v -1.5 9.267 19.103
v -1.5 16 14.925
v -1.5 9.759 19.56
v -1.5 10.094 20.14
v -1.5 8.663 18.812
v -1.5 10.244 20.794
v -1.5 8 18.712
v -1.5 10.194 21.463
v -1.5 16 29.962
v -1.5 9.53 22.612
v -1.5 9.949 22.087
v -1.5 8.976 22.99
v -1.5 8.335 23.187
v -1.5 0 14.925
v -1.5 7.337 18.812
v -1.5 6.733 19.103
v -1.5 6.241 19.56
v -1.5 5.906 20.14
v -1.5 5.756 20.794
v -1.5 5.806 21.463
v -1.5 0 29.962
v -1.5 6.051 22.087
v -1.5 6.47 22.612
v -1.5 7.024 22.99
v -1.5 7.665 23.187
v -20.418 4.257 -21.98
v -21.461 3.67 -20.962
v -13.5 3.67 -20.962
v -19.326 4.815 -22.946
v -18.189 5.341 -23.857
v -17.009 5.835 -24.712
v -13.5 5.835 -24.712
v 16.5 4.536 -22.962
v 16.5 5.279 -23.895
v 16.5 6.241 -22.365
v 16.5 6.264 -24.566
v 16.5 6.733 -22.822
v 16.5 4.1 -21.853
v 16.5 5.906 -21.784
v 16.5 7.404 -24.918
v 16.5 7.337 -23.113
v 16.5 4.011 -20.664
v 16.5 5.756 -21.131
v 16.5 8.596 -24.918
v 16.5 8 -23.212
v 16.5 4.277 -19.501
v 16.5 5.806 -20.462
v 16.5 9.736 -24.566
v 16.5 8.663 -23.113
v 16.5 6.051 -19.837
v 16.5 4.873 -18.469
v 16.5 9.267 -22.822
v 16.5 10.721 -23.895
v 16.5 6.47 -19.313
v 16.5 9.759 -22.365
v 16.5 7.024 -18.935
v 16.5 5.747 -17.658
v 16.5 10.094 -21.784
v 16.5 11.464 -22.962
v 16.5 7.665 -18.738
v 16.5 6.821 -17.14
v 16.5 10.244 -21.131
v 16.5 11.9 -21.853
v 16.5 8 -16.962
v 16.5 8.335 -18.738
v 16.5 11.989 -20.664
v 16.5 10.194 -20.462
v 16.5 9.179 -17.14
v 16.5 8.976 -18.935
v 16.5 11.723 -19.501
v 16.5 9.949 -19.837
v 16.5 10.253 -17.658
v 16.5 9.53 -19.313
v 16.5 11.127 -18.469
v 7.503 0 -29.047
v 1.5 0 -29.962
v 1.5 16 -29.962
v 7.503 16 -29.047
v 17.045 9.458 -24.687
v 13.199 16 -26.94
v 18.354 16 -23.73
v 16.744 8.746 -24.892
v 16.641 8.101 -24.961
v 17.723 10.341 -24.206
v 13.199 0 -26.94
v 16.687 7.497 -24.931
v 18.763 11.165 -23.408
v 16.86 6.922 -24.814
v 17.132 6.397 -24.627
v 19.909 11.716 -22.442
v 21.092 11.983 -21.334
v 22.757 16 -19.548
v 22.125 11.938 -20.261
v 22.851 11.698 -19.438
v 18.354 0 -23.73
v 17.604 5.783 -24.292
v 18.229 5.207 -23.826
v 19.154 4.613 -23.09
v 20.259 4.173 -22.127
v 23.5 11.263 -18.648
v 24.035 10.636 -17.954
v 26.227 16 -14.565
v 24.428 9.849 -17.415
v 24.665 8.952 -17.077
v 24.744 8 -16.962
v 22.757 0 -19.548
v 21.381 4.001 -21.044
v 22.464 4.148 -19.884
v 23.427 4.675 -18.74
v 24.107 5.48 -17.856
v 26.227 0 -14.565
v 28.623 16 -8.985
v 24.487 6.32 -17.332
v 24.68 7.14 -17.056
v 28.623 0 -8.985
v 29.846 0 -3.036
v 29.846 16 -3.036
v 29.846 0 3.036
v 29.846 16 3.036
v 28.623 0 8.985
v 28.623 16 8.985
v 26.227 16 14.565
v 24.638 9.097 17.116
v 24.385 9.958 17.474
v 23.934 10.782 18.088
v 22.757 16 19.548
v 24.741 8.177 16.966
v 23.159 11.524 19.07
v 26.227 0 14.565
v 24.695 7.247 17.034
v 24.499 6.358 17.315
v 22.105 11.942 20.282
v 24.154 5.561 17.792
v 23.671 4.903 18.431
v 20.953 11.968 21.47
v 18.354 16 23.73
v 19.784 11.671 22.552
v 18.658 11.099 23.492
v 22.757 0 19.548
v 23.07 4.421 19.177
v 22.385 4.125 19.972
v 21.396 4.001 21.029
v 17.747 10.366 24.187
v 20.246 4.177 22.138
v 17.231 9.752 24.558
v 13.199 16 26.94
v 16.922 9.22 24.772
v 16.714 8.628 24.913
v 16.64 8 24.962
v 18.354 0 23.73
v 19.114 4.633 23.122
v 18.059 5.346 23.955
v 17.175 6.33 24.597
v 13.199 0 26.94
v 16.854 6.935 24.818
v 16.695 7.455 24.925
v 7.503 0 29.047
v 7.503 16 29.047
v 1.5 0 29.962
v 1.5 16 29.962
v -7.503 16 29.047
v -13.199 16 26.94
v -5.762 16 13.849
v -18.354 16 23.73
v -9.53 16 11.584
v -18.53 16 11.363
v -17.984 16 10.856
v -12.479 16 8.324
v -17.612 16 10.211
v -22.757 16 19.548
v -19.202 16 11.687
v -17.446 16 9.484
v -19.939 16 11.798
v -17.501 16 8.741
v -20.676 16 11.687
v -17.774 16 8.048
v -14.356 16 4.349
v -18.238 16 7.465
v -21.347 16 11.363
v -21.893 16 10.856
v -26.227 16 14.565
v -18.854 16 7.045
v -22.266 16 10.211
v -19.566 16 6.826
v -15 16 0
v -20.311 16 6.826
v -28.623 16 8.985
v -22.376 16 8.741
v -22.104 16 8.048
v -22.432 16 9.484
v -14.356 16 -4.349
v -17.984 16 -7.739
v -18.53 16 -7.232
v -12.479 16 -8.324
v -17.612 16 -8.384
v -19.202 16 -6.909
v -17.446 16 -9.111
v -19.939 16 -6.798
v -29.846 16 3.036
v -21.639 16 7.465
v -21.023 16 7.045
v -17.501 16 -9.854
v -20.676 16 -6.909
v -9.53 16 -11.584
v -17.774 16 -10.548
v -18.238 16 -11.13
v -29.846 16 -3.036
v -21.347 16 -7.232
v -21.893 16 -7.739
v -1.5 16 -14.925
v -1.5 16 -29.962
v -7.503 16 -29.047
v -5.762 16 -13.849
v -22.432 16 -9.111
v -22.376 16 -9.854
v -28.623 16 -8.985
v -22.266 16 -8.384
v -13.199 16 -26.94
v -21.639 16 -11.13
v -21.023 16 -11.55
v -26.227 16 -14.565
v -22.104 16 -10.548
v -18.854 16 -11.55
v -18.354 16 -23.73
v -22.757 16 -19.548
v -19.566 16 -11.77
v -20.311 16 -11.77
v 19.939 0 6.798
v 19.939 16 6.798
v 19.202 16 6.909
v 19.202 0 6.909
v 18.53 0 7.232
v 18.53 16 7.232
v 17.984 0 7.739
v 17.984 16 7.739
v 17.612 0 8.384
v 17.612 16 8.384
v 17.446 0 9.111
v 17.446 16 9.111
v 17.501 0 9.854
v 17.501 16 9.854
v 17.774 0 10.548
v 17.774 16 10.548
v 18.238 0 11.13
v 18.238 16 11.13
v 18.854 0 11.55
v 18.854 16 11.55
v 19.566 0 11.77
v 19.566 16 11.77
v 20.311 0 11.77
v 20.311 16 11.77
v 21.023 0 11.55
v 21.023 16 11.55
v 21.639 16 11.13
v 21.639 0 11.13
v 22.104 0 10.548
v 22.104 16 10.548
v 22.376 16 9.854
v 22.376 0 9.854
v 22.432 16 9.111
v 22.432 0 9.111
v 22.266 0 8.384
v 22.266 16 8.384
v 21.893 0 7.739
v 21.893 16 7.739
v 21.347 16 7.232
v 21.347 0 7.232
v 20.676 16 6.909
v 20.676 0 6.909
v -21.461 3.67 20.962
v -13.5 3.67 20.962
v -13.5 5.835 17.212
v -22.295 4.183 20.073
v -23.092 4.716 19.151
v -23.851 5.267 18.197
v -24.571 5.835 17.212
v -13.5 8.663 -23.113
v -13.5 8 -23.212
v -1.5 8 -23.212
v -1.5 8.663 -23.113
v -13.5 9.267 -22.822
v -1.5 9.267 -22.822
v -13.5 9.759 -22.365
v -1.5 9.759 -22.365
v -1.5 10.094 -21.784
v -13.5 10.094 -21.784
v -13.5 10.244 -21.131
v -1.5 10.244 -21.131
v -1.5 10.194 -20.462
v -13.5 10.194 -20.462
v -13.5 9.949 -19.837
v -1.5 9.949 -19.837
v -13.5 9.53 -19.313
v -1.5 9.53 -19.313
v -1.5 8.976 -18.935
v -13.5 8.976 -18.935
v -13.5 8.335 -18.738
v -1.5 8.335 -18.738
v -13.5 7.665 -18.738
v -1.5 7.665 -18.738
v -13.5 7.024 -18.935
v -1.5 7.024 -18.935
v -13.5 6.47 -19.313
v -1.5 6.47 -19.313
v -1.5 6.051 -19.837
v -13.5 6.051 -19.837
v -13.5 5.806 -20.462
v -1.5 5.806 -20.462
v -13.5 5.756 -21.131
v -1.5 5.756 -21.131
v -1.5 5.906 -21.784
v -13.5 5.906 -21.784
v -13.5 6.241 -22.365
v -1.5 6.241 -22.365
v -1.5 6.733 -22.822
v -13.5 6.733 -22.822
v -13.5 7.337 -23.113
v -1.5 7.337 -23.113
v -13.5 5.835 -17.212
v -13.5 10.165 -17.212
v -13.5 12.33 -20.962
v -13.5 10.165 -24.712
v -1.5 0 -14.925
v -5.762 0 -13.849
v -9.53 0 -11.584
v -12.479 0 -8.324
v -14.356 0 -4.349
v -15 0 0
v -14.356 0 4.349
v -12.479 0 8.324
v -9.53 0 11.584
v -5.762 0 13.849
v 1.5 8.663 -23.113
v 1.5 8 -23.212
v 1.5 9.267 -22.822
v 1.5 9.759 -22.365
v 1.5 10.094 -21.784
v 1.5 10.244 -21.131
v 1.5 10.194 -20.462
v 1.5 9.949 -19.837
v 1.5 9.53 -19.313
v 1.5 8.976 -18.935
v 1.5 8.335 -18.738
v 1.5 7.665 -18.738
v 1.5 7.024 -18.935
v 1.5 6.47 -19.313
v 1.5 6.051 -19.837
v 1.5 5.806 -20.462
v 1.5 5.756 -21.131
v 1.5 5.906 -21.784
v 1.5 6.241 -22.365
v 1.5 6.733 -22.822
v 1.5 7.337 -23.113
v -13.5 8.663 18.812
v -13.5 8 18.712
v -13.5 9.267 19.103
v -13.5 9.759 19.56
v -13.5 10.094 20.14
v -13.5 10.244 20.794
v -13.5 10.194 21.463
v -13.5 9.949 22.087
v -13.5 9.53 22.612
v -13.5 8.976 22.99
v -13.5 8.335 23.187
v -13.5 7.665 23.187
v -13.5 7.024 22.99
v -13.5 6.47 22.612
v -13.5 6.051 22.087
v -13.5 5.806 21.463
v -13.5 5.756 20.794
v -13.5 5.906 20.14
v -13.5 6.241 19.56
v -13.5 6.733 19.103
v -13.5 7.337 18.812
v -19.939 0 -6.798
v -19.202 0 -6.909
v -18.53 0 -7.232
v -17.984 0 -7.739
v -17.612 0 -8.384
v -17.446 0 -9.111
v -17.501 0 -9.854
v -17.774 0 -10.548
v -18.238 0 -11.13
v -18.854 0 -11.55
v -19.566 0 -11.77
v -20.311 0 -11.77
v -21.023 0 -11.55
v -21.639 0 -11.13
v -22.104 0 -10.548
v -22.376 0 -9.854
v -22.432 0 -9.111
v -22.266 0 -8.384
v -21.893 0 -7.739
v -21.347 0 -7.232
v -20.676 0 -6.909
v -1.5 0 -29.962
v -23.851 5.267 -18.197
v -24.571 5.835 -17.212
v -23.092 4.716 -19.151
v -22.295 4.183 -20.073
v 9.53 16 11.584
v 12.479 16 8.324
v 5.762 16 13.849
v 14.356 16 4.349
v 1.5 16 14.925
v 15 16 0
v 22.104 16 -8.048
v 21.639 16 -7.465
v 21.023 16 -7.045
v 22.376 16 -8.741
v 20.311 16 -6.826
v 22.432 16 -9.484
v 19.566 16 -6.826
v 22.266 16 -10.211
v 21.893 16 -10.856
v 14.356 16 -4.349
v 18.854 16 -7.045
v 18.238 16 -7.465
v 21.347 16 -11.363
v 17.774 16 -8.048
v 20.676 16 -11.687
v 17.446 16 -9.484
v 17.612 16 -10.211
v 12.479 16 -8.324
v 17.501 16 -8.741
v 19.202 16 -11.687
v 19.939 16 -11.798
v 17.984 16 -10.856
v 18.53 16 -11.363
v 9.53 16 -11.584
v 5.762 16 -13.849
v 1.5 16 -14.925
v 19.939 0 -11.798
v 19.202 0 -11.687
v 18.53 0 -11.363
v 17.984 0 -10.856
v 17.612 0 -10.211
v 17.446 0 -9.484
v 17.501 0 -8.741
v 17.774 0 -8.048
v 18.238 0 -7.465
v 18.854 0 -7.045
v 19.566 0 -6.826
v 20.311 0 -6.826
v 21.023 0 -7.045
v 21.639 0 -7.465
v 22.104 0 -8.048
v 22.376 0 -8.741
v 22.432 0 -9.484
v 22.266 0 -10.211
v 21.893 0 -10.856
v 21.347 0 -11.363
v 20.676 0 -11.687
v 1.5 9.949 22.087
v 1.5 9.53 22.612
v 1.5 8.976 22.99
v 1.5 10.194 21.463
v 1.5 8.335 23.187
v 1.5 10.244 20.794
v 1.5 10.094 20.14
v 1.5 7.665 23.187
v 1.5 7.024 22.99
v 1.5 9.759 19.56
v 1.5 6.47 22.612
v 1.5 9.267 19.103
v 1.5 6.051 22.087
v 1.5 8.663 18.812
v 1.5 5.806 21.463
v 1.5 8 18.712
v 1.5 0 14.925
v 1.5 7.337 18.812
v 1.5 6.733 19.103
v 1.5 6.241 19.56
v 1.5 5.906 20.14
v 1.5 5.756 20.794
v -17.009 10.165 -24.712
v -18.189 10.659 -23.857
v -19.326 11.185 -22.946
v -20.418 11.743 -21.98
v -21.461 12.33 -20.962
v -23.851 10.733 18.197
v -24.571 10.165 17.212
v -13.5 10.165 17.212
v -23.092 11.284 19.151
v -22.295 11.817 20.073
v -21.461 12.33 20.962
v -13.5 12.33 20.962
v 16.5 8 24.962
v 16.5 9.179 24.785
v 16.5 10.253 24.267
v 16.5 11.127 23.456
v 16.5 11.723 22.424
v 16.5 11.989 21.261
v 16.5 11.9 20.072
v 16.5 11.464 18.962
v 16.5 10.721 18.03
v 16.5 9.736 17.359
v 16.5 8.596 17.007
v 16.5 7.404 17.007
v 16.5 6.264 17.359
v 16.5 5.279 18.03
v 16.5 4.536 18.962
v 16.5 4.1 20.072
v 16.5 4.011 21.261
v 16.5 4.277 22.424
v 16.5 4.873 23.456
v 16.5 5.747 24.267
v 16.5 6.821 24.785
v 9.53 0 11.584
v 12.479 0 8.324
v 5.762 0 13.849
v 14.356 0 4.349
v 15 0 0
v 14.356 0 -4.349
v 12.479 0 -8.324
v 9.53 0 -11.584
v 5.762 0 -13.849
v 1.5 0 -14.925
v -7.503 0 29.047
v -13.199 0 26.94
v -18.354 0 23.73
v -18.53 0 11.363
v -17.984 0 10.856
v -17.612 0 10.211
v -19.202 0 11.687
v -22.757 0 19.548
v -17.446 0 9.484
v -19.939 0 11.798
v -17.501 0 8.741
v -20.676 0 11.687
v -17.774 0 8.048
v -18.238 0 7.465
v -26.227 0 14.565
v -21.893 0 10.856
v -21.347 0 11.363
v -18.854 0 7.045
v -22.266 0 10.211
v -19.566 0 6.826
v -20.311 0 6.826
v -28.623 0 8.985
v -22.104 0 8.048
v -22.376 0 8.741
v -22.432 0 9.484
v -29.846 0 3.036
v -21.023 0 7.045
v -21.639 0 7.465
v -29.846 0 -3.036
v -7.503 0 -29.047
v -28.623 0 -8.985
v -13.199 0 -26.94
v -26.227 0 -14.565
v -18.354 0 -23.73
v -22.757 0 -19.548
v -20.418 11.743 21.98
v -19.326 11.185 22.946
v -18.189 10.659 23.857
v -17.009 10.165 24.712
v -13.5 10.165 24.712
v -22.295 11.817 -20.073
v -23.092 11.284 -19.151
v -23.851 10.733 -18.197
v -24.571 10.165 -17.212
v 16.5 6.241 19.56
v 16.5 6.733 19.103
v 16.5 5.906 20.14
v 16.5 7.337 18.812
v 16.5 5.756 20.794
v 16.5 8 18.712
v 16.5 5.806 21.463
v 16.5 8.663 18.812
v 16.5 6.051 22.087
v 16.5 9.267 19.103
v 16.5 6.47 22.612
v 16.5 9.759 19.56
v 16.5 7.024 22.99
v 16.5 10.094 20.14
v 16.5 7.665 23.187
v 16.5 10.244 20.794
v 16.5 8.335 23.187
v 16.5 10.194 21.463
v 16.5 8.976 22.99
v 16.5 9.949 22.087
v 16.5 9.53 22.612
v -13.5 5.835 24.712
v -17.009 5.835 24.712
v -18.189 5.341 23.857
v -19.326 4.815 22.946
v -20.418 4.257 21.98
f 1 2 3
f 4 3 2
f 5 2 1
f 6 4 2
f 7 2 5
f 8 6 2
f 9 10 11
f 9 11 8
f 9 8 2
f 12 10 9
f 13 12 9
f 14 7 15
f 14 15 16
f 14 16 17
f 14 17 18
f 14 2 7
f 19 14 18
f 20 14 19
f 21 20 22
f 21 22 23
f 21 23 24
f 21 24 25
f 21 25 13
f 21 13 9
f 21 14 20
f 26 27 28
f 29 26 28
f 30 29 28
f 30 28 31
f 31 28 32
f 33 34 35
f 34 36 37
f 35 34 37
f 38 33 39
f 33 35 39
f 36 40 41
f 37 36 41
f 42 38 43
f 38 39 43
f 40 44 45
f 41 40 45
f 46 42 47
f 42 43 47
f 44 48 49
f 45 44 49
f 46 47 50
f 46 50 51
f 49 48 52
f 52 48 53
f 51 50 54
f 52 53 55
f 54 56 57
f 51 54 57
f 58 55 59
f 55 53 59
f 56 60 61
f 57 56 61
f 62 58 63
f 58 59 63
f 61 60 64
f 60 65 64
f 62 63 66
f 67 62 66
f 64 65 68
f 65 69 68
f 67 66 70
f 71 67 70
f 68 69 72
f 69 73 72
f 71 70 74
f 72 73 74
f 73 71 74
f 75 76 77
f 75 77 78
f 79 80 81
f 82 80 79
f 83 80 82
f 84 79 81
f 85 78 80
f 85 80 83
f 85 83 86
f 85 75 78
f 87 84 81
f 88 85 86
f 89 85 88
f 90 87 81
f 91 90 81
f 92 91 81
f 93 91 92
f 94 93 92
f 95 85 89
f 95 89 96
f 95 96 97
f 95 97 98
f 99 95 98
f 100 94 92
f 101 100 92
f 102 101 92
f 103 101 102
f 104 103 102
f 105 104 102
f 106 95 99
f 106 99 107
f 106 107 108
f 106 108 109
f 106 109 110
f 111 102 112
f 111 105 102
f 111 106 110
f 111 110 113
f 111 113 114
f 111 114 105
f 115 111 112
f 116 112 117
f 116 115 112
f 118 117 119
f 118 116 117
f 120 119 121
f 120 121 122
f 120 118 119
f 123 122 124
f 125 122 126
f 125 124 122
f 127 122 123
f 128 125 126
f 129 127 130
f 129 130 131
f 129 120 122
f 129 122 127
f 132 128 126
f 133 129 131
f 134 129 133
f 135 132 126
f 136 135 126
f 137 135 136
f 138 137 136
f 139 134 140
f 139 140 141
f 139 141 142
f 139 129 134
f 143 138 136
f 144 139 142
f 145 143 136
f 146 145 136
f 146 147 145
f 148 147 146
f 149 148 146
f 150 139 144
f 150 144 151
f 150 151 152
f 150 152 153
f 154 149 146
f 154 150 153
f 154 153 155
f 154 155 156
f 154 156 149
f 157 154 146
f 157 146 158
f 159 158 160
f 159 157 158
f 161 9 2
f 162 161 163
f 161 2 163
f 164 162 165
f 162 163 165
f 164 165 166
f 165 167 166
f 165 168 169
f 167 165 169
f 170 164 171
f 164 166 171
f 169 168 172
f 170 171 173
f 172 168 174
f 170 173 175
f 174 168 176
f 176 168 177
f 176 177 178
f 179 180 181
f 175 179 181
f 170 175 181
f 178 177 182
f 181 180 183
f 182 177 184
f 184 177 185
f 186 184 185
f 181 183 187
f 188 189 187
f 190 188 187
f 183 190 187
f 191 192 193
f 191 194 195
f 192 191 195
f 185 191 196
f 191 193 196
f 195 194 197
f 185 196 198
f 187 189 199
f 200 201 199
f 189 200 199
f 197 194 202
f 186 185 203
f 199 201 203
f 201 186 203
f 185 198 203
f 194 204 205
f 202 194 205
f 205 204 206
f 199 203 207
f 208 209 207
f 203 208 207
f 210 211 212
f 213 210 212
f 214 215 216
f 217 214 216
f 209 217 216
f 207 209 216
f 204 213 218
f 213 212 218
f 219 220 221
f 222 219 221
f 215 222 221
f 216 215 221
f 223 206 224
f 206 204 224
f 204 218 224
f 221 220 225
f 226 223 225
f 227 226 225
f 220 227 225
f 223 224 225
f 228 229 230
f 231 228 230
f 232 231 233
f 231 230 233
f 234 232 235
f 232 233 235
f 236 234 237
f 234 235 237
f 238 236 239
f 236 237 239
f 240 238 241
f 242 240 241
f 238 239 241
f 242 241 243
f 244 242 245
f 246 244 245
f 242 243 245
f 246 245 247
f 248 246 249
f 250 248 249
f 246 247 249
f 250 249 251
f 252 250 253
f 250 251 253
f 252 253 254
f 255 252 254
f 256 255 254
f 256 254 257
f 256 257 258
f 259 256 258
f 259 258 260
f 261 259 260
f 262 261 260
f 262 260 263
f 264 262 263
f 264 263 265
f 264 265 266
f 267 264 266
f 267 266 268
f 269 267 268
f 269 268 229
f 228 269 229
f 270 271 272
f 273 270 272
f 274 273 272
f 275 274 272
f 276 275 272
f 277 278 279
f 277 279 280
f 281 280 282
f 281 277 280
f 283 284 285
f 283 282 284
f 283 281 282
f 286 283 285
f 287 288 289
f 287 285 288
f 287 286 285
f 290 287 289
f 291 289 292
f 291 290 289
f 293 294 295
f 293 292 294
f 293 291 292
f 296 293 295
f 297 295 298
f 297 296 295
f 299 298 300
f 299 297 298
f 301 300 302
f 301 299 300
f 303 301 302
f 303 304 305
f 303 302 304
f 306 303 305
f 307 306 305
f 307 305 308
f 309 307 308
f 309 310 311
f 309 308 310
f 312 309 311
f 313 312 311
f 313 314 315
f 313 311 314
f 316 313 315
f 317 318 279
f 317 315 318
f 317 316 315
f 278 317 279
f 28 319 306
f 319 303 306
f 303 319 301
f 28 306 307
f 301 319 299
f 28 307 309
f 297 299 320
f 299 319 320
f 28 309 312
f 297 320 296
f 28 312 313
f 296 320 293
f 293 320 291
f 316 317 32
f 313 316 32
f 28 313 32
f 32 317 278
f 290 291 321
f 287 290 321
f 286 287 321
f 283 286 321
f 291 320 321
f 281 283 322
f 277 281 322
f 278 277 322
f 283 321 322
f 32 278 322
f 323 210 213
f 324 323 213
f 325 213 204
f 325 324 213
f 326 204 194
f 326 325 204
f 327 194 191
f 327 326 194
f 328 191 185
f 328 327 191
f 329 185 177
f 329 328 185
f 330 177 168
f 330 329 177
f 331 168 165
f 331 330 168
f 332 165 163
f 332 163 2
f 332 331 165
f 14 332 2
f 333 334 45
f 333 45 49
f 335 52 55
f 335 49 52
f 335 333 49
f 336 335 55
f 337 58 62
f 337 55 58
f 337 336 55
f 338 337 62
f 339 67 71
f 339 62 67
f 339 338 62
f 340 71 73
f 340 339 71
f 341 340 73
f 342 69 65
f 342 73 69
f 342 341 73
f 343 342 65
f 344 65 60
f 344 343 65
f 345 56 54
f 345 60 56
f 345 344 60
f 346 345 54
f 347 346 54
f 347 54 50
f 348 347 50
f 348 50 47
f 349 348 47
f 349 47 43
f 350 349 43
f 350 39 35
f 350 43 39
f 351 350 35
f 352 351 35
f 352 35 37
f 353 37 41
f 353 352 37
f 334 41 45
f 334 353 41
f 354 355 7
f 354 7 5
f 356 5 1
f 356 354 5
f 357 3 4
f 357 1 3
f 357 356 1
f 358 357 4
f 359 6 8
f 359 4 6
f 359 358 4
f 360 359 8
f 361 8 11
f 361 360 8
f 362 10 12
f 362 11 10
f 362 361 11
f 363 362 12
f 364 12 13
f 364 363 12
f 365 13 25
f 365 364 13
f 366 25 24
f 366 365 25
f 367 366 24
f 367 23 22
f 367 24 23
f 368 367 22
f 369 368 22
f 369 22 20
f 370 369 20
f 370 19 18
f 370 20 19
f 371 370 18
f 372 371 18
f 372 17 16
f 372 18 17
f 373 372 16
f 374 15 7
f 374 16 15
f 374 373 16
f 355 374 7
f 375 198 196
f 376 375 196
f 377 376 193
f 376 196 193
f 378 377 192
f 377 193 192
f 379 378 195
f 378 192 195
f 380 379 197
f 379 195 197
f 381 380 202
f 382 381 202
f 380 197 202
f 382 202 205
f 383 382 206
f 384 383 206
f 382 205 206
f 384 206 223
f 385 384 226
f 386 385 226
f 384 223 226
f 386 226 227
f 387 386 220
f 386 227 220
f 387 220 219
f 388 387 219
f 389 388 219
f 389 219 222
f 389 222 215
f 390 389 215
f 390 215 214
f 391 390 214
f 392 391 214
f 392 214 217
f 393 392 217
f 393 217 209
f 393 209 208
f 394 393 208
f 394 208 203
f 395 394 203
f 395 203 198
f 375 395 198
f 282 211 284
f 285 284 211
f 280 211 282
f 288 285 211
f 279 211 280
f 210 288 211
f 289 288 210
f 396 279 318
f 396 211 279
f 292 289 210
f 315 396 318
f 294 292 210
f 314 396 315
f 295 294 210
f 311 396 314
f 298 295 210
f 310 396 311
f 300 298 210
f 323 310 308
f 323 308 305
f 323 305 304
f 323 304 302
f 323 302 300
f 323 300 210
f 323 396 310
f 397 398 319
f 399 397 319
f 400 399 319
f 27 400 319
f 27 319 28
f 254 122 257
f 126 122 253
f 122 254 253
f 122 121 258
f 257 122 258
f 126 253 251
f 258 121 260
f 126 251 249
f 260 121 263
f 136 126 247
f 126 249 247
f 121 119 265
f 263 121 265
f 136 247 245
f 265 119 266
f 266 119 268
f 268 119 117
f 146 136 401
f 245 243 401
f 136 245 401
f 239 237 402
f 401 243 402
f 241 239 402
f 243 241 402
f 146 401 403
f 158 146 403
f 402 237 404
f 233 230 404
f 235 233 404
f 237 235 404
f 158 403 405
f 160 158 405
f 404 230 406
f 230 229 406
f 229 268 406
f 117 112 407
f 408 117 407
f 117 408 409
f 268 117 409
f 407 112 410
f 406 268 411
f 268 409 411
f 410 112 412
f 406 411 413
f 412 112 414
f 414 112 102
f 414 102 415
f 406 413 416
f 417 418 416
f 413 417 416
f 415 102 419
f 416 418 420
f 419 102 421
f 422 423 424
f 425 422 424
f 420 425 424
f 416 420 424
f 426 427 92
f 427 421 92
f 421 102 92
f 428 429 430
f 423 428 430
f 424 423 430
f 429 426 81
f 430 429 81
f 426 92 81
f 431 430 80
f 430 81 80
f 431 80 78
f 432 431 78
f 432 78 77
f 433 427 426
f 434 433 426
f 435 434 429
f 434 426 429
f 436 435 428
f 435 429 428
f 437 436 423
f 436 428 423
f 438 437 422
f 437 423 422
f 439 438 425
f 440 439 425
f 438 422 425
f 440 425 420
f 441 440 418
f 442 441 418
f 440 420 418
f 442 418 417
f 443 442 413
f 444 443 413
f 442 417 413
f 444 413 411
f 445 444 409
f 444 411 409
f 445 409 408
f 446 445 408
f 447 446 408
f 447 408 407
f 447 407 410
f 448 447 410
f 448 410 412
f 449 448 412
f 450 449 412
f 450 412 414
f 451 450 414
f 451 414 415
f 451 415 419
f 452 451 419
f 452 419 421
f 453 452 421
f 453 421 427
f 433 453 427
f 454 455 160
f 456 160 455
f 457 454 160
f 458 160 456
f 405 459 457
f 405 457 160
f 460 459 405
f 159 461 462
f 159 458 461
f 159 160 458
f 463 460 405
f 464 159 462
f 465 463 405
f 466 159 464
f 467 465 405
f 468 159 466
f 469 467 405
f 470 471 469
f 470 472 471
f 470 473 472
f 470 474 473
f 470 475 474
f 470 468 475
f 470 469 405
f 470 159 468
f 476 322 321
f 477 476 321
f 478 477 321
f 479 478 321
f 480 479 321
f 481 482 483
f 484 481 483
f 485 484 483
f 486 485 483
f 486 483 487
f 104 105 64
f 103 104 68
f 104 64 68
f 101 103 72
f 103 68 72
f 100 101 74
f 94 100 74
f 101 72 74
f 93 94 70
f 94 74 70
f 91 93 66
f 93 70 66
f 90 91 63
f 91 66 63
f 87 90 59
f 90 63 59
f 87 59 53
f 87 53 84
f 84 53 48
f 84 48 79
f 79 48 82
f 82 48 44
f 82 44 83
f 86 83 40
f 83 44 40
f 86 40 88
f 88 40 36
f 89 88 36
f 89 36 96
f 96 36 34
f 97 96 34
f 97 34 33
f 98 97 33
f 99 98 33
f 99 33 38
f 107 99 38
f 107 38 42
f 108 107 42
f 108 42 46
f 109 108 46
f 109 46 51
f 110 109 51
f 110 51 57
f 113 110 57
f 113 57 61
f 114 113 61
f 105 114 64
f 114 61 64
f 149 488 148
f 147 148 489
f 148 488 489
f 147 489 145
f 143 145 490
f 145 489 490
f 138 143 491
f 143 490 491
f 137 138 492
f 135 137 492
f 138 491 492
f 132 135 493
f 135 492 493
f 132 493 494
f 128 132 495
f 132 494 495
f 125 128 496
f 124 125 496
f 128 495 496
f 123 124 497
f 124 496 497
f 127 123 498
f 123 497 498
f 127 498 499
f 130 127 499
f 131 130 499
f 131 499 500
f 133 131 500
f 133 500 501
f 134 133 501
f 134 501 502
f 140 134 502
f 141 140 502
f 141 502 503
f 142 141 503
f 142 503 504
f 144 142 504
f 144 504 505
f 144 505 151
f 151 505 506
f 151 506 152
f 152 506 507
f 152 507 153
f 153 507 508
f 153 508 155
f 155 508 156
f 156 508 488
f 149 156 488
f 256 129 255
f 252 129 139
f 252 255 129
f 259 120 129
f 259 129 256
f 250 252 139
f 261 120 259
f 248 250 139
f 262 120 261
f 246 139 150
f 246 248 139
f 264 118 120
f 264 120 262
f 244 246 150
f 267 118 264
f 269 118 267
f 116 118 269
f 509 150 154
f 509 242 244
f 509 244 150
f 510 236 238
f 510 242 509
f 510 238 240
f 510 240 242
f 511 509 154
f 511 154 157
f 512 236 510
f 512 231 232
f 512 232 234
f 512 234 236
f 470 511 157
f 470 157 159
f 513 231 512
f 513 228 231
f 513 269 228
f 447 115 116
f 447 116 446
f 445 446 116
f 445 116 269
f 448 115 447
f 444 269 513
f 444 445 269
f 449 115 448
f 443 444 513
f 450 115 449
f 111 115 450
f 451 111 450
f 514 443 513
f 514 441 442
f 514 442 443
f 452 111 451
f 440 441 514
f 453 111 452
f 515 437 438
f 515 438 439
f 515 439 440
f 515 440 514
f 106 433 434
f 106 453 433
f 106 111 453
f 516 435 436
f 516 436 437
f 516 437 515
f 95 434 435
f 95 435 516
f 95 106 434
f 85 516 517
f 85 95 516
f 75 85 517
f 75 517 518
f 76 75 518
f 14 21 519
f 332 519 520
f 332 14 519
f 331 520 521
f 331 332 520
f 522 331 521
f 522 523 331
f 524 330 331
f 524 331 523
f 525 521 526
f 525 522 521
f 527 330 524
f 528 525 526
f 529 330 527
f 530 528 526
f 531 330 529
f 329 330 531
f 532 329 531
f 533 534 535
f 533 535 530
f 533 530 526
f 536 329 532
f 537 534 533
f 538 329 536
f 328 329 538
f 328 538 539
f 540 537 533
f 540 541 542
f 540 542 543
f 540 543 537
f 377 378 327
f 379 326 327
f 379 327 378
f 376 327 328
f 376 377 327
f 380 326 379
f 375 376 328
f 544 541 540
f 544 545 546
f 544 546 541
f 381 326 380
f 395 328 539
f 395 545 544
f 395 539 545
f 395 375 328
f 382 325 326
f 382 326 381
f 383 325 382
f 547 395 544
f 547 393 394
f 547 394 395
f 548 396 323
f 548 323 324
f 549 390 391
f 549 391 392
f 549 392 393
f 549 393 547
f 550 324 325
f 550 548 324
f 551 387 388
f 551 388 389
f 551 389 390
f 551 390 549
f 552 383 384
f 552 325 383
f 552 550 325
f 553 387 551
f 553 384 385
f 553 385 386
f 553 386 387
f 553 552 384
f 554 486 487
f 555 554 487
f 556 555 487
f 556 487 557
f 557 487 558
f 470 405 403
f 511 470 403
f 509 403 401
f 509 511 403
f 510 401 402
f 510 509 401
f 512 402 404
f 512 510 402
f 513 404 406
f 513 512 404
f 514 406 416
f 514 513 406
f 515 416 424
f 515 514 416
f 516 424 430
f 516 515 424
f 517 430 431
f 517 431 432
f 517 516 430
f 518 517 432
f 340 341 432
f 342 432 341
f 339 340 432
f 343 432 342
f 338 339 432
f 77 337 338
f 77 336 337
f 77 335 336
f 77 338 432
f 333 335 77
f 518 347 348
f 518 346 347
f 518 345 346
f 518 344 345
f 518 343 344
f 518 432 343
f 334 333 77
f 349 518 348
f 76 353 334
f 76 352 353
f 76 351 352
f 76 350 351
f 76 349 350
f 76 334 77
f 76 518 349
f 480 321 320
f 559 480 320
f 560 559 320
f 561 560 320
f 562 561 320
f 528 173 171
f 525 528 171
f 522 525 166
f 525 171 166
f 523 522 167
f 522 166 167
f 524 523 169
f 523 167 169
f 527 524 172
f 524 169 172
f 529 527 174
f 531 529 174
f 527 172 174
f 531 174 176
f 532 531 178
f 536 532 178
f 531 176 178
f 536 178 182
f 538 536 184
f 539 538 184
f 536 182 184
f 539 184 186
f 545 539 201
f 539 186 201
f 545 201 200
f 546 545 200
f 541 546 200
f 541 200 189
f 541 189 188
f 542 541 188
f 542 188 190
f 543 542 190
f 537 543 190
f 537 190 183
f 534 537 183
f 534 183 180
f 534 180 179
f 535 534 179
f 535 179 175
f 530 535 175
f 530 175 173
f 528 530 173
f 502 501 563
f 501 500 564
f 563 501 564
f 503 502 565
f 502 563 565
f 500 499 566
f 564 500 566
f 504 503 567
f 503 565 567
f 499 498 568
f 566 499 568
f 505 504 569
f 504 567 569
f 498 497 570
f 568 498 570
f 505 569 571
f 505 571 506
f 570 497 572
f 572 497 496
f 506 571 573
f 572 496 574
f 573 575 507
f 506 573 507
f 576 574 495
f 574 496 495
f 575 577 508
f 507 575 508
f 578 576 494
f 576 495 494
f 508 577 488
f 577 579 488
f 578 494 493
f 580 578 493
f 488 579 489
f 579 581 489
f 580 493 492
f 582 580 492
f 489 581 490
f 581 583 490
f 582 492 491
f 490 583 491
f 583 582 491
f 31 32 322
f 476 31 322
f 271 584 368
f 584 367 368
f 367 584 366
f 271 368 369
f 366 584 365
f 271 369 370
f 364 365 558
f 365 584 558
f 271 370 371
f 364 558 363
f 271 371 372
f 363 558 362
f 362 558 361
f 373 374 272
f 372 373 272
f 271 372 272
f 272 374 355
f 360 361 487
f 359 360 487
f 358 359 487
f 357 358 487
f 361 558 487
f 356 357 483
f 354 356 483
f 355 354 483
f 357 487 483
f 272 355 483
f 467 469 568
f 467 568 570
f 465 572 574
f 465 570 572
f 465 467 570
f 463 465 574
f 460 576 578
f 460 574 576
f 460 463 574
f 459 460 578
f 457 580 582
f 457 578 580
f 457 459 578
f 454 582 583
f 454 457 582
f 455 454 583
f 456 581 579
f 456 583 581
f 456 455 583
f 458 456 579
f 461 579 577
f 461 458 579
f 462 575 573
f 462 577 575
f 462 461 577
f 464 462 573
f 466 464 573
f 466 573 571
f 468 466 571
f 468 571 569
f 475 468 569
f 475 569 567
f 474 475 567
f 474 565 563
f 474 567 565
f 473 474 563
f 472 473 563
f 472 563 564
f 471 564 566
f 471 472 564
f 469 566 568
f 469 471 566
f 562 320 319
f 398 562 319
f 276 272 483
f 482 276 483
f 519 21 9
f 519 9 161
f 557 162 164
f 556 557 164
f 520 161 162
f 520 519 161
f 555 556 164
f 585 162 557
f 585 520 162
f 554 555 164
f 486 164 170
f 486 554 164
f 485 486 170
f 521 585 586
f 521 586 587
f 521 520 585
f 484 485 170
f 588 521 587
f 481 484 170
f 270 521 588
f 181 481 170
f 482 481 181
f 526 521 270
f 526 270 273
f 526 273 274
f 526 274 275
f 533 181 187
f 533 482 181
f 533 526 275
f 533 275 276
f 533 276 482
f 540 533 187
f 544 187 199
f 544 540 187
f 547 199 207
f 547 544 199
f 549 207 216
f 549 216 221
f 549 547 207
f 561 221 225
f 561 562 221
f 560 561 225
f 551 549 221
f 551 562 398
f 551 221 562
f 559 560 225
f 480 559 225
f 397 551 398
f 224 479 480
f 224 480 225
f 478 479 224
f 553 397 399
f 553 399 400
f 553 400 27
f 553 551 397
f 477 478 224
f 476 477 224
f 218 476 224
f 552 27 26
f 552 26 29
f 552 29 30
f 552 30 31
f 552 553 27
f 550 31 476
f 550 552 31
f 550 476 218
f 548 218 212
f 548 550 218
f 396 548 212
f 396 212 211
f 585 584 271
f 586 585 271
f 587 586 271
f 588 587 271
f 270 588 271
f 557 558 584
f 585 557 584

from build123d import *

# Parameters (mm, degrees)
BOSS_EXTRUDE1_DEPTH     = 16
BOSS_EXTRUDE1_2_DEPTH   = 16
CUT_EXTRUDE1_DEPTH      = 46.318318592
CUT_EXTRUDE1_DEPTH_BACK = 46.318318592
SKETCH2_R               = 2.25
CUT_EXTRUDE2_START      = -15
SKETCH3_R               = 4
CUT_EXTRUDE2_DEPTH      = 32.324939455
CUT_EXTRUDE3_START      = -12
CUT_EXTRUDE3_DEPTH      = 35.324939455
SKETCH5_R               = 2.5
CUT_EXTRUDE4_DEPTH      = 46.31831876


with BuildPart() as part:
    # Sketch1 → Boss-Extrude1 (new body)
    with BuildSketch(Plane(origin=(0, 0, 0), x_dir=(1, 0, 0), z_dir=(0, 1, 0))):
        with BuildLine():
            Line((-1.5, 29.962476533), (-1.5, 14.924811557))
            ThreePointArc((-1.5, 14.924811557), (-15, 0), (-1.5, -14.924811557))
            Line((-1.5, -14.924811557), (-1.5, -29.962476533))
            ThreePointArc((-1.5, -29.962476533), (-30, 0), (-1.5, 29.962476533))
        make_face()
    extrude(amount=BOSS_EXTRUDE1_DEPTH)


with BuildPart() as body_2:
    # Sketch1 → Boss-Extrude1 2 (new body)
    with BuildSketch(Plane(origin=(0, 0, 0), x_dir=(1, 0, 0), z_dir=(0, 1, 0))):
        with BuildLine():
            Line((1.5, -29.962476533), (1.5, -14.924811557))
            ThreePointArc((1.5, -14.924811557), (15, 0), (1.5, 14.924811557))
            Line((1.5, 14.924811557), (1.5, 29.962476533))
            ThreePointArc((1.5, 29.962476533), (30, 0), (1.5, -29.962476533))
        make_face()
    extrude(amount=BOSS_EXTRUDE1_2_DEPTH)


with BuildPart() as cut_extrude1_tool:
    # Sketch2 → Cut-Extrude1 (new, two sides: drawn at the far end of the back side and taken through both)
    with BuildSketch(Plane(origin=(0, 0, 0), x_dir=(0, 0, -1), z_dir=(1, 0, 0)).offset(-CUT_EXTRUDE1_DEPTH_BACK)):
        with Locations((-20.962476533, 8)):
            Circle(SKETCH2_R)
        with Locations((20.962476533, 8)):
            Circle(SKETCH2_R)
    extrude(amount=CUT_EXTRUDE1_DEPTH + CUT_EXTRUDE1_DEPTH_BACK)


with BuildPart() as part_1:
    add(part.part)

    # Cut-Extrude1: cut by cut_extrude1_tool
    add(cut_extrude1_tool.part, mode=Mode.SUBTRACT)

    # Sketch4 → Cut-Extrude3 (cut, through all)
    with BuildSketch(Plane(origin=(-1.5, 0, 0), x_dir=(0, 0, -1), z_dir=(1, 0, 0)).offset(CUT_EXTRUDE3_START)):
        Polygon((-20.962476533, 12.330127019), (-24.712476533, 10.165063509), (-24.712476533, 5.834936491), (-20.962476533, 3.669872981), (-17.212476533, 5.834936491), (-17.212476533, 10.165063509), align=None)
        Polygon((20.962476533, 12.330127019), (17.212476533, 10.165063509), (17.212476533, 5.834936491), (20.962476533, 3.669872981), (24.712476533, 5.834936491), (24.712476533, 10.165063509), align=None)
    extrude(amount=-CUT_EXTRUDE3_DEPTH, mode=Mode.SUBTRACT)


with BuildPart() as body_2_1:
    add(body_2.part)

    # Cut-Extrude1: cut by cut_extrude1_tool
    add(cut_extrude1_tool.part, mode=Mode.SUBTRACT)

    # Sketch3 → Cut-Extrude2 (cut, through all)
    with BuildSketch(Plane.ZY.offset(-1.5).offset(CUT_EXTRUDE2_START)):
        with Locations((-20.962476533, 8)):
            Circle(SKETCH3_R)
        with Locations((20.962476533, 8)):
            Circle(SKETCH3_R)
    extrude(amount=-CUT_EXTRUDE2_DEPTH, mode=Mode.SUBTRACT)


with BuildPart() as cut_extrude4_tool:
    # Sketch5 → Cut-Extrude4 (new, through all)
    with BuildSketch(Plane(origin=(0, 16, 0), x_dir=(1, 0, 0), z_dir=(0, 1, 0))):
        with Locations(Location((-19.938771315, 9.297601758, 0), (0, 0, 270))):
            Circle(SKETCH5_R)
        with Locations(Location((-19.938771315, -9.297601758, 0), (0, 0, 270))):
            Circle(SKETCH5_R)
        with Locations(Location((19.938771315, -9.297601758, 0), (0, 0, 90))):
            Circle(SKETCH5_R)
        with Locations(Location((19.938771315, 9.297601758, 0), (0, 0, 90))):
            Circle(SKETCH5_R)
    extrude(amount=-CUT_EXTRUDE4_DEPTH)


with BuildPart() as part_2:
    add(part_1.part)

    # Cut-Extrude4: cut by cut_extrude4_tool
    add(cut_extrude4_tool.part, mode=Mode.SUBTRACT)


with BuildPart() as body_2_2:
    add(body_2_1.part)

    # Cut-Extrude4: cut by cut_extrude4_tool
    add(cut_extrude4_tool.part, mode=Mode.SUBTRACT)


solid = Compound([part_2.part, body_2_2.part])
